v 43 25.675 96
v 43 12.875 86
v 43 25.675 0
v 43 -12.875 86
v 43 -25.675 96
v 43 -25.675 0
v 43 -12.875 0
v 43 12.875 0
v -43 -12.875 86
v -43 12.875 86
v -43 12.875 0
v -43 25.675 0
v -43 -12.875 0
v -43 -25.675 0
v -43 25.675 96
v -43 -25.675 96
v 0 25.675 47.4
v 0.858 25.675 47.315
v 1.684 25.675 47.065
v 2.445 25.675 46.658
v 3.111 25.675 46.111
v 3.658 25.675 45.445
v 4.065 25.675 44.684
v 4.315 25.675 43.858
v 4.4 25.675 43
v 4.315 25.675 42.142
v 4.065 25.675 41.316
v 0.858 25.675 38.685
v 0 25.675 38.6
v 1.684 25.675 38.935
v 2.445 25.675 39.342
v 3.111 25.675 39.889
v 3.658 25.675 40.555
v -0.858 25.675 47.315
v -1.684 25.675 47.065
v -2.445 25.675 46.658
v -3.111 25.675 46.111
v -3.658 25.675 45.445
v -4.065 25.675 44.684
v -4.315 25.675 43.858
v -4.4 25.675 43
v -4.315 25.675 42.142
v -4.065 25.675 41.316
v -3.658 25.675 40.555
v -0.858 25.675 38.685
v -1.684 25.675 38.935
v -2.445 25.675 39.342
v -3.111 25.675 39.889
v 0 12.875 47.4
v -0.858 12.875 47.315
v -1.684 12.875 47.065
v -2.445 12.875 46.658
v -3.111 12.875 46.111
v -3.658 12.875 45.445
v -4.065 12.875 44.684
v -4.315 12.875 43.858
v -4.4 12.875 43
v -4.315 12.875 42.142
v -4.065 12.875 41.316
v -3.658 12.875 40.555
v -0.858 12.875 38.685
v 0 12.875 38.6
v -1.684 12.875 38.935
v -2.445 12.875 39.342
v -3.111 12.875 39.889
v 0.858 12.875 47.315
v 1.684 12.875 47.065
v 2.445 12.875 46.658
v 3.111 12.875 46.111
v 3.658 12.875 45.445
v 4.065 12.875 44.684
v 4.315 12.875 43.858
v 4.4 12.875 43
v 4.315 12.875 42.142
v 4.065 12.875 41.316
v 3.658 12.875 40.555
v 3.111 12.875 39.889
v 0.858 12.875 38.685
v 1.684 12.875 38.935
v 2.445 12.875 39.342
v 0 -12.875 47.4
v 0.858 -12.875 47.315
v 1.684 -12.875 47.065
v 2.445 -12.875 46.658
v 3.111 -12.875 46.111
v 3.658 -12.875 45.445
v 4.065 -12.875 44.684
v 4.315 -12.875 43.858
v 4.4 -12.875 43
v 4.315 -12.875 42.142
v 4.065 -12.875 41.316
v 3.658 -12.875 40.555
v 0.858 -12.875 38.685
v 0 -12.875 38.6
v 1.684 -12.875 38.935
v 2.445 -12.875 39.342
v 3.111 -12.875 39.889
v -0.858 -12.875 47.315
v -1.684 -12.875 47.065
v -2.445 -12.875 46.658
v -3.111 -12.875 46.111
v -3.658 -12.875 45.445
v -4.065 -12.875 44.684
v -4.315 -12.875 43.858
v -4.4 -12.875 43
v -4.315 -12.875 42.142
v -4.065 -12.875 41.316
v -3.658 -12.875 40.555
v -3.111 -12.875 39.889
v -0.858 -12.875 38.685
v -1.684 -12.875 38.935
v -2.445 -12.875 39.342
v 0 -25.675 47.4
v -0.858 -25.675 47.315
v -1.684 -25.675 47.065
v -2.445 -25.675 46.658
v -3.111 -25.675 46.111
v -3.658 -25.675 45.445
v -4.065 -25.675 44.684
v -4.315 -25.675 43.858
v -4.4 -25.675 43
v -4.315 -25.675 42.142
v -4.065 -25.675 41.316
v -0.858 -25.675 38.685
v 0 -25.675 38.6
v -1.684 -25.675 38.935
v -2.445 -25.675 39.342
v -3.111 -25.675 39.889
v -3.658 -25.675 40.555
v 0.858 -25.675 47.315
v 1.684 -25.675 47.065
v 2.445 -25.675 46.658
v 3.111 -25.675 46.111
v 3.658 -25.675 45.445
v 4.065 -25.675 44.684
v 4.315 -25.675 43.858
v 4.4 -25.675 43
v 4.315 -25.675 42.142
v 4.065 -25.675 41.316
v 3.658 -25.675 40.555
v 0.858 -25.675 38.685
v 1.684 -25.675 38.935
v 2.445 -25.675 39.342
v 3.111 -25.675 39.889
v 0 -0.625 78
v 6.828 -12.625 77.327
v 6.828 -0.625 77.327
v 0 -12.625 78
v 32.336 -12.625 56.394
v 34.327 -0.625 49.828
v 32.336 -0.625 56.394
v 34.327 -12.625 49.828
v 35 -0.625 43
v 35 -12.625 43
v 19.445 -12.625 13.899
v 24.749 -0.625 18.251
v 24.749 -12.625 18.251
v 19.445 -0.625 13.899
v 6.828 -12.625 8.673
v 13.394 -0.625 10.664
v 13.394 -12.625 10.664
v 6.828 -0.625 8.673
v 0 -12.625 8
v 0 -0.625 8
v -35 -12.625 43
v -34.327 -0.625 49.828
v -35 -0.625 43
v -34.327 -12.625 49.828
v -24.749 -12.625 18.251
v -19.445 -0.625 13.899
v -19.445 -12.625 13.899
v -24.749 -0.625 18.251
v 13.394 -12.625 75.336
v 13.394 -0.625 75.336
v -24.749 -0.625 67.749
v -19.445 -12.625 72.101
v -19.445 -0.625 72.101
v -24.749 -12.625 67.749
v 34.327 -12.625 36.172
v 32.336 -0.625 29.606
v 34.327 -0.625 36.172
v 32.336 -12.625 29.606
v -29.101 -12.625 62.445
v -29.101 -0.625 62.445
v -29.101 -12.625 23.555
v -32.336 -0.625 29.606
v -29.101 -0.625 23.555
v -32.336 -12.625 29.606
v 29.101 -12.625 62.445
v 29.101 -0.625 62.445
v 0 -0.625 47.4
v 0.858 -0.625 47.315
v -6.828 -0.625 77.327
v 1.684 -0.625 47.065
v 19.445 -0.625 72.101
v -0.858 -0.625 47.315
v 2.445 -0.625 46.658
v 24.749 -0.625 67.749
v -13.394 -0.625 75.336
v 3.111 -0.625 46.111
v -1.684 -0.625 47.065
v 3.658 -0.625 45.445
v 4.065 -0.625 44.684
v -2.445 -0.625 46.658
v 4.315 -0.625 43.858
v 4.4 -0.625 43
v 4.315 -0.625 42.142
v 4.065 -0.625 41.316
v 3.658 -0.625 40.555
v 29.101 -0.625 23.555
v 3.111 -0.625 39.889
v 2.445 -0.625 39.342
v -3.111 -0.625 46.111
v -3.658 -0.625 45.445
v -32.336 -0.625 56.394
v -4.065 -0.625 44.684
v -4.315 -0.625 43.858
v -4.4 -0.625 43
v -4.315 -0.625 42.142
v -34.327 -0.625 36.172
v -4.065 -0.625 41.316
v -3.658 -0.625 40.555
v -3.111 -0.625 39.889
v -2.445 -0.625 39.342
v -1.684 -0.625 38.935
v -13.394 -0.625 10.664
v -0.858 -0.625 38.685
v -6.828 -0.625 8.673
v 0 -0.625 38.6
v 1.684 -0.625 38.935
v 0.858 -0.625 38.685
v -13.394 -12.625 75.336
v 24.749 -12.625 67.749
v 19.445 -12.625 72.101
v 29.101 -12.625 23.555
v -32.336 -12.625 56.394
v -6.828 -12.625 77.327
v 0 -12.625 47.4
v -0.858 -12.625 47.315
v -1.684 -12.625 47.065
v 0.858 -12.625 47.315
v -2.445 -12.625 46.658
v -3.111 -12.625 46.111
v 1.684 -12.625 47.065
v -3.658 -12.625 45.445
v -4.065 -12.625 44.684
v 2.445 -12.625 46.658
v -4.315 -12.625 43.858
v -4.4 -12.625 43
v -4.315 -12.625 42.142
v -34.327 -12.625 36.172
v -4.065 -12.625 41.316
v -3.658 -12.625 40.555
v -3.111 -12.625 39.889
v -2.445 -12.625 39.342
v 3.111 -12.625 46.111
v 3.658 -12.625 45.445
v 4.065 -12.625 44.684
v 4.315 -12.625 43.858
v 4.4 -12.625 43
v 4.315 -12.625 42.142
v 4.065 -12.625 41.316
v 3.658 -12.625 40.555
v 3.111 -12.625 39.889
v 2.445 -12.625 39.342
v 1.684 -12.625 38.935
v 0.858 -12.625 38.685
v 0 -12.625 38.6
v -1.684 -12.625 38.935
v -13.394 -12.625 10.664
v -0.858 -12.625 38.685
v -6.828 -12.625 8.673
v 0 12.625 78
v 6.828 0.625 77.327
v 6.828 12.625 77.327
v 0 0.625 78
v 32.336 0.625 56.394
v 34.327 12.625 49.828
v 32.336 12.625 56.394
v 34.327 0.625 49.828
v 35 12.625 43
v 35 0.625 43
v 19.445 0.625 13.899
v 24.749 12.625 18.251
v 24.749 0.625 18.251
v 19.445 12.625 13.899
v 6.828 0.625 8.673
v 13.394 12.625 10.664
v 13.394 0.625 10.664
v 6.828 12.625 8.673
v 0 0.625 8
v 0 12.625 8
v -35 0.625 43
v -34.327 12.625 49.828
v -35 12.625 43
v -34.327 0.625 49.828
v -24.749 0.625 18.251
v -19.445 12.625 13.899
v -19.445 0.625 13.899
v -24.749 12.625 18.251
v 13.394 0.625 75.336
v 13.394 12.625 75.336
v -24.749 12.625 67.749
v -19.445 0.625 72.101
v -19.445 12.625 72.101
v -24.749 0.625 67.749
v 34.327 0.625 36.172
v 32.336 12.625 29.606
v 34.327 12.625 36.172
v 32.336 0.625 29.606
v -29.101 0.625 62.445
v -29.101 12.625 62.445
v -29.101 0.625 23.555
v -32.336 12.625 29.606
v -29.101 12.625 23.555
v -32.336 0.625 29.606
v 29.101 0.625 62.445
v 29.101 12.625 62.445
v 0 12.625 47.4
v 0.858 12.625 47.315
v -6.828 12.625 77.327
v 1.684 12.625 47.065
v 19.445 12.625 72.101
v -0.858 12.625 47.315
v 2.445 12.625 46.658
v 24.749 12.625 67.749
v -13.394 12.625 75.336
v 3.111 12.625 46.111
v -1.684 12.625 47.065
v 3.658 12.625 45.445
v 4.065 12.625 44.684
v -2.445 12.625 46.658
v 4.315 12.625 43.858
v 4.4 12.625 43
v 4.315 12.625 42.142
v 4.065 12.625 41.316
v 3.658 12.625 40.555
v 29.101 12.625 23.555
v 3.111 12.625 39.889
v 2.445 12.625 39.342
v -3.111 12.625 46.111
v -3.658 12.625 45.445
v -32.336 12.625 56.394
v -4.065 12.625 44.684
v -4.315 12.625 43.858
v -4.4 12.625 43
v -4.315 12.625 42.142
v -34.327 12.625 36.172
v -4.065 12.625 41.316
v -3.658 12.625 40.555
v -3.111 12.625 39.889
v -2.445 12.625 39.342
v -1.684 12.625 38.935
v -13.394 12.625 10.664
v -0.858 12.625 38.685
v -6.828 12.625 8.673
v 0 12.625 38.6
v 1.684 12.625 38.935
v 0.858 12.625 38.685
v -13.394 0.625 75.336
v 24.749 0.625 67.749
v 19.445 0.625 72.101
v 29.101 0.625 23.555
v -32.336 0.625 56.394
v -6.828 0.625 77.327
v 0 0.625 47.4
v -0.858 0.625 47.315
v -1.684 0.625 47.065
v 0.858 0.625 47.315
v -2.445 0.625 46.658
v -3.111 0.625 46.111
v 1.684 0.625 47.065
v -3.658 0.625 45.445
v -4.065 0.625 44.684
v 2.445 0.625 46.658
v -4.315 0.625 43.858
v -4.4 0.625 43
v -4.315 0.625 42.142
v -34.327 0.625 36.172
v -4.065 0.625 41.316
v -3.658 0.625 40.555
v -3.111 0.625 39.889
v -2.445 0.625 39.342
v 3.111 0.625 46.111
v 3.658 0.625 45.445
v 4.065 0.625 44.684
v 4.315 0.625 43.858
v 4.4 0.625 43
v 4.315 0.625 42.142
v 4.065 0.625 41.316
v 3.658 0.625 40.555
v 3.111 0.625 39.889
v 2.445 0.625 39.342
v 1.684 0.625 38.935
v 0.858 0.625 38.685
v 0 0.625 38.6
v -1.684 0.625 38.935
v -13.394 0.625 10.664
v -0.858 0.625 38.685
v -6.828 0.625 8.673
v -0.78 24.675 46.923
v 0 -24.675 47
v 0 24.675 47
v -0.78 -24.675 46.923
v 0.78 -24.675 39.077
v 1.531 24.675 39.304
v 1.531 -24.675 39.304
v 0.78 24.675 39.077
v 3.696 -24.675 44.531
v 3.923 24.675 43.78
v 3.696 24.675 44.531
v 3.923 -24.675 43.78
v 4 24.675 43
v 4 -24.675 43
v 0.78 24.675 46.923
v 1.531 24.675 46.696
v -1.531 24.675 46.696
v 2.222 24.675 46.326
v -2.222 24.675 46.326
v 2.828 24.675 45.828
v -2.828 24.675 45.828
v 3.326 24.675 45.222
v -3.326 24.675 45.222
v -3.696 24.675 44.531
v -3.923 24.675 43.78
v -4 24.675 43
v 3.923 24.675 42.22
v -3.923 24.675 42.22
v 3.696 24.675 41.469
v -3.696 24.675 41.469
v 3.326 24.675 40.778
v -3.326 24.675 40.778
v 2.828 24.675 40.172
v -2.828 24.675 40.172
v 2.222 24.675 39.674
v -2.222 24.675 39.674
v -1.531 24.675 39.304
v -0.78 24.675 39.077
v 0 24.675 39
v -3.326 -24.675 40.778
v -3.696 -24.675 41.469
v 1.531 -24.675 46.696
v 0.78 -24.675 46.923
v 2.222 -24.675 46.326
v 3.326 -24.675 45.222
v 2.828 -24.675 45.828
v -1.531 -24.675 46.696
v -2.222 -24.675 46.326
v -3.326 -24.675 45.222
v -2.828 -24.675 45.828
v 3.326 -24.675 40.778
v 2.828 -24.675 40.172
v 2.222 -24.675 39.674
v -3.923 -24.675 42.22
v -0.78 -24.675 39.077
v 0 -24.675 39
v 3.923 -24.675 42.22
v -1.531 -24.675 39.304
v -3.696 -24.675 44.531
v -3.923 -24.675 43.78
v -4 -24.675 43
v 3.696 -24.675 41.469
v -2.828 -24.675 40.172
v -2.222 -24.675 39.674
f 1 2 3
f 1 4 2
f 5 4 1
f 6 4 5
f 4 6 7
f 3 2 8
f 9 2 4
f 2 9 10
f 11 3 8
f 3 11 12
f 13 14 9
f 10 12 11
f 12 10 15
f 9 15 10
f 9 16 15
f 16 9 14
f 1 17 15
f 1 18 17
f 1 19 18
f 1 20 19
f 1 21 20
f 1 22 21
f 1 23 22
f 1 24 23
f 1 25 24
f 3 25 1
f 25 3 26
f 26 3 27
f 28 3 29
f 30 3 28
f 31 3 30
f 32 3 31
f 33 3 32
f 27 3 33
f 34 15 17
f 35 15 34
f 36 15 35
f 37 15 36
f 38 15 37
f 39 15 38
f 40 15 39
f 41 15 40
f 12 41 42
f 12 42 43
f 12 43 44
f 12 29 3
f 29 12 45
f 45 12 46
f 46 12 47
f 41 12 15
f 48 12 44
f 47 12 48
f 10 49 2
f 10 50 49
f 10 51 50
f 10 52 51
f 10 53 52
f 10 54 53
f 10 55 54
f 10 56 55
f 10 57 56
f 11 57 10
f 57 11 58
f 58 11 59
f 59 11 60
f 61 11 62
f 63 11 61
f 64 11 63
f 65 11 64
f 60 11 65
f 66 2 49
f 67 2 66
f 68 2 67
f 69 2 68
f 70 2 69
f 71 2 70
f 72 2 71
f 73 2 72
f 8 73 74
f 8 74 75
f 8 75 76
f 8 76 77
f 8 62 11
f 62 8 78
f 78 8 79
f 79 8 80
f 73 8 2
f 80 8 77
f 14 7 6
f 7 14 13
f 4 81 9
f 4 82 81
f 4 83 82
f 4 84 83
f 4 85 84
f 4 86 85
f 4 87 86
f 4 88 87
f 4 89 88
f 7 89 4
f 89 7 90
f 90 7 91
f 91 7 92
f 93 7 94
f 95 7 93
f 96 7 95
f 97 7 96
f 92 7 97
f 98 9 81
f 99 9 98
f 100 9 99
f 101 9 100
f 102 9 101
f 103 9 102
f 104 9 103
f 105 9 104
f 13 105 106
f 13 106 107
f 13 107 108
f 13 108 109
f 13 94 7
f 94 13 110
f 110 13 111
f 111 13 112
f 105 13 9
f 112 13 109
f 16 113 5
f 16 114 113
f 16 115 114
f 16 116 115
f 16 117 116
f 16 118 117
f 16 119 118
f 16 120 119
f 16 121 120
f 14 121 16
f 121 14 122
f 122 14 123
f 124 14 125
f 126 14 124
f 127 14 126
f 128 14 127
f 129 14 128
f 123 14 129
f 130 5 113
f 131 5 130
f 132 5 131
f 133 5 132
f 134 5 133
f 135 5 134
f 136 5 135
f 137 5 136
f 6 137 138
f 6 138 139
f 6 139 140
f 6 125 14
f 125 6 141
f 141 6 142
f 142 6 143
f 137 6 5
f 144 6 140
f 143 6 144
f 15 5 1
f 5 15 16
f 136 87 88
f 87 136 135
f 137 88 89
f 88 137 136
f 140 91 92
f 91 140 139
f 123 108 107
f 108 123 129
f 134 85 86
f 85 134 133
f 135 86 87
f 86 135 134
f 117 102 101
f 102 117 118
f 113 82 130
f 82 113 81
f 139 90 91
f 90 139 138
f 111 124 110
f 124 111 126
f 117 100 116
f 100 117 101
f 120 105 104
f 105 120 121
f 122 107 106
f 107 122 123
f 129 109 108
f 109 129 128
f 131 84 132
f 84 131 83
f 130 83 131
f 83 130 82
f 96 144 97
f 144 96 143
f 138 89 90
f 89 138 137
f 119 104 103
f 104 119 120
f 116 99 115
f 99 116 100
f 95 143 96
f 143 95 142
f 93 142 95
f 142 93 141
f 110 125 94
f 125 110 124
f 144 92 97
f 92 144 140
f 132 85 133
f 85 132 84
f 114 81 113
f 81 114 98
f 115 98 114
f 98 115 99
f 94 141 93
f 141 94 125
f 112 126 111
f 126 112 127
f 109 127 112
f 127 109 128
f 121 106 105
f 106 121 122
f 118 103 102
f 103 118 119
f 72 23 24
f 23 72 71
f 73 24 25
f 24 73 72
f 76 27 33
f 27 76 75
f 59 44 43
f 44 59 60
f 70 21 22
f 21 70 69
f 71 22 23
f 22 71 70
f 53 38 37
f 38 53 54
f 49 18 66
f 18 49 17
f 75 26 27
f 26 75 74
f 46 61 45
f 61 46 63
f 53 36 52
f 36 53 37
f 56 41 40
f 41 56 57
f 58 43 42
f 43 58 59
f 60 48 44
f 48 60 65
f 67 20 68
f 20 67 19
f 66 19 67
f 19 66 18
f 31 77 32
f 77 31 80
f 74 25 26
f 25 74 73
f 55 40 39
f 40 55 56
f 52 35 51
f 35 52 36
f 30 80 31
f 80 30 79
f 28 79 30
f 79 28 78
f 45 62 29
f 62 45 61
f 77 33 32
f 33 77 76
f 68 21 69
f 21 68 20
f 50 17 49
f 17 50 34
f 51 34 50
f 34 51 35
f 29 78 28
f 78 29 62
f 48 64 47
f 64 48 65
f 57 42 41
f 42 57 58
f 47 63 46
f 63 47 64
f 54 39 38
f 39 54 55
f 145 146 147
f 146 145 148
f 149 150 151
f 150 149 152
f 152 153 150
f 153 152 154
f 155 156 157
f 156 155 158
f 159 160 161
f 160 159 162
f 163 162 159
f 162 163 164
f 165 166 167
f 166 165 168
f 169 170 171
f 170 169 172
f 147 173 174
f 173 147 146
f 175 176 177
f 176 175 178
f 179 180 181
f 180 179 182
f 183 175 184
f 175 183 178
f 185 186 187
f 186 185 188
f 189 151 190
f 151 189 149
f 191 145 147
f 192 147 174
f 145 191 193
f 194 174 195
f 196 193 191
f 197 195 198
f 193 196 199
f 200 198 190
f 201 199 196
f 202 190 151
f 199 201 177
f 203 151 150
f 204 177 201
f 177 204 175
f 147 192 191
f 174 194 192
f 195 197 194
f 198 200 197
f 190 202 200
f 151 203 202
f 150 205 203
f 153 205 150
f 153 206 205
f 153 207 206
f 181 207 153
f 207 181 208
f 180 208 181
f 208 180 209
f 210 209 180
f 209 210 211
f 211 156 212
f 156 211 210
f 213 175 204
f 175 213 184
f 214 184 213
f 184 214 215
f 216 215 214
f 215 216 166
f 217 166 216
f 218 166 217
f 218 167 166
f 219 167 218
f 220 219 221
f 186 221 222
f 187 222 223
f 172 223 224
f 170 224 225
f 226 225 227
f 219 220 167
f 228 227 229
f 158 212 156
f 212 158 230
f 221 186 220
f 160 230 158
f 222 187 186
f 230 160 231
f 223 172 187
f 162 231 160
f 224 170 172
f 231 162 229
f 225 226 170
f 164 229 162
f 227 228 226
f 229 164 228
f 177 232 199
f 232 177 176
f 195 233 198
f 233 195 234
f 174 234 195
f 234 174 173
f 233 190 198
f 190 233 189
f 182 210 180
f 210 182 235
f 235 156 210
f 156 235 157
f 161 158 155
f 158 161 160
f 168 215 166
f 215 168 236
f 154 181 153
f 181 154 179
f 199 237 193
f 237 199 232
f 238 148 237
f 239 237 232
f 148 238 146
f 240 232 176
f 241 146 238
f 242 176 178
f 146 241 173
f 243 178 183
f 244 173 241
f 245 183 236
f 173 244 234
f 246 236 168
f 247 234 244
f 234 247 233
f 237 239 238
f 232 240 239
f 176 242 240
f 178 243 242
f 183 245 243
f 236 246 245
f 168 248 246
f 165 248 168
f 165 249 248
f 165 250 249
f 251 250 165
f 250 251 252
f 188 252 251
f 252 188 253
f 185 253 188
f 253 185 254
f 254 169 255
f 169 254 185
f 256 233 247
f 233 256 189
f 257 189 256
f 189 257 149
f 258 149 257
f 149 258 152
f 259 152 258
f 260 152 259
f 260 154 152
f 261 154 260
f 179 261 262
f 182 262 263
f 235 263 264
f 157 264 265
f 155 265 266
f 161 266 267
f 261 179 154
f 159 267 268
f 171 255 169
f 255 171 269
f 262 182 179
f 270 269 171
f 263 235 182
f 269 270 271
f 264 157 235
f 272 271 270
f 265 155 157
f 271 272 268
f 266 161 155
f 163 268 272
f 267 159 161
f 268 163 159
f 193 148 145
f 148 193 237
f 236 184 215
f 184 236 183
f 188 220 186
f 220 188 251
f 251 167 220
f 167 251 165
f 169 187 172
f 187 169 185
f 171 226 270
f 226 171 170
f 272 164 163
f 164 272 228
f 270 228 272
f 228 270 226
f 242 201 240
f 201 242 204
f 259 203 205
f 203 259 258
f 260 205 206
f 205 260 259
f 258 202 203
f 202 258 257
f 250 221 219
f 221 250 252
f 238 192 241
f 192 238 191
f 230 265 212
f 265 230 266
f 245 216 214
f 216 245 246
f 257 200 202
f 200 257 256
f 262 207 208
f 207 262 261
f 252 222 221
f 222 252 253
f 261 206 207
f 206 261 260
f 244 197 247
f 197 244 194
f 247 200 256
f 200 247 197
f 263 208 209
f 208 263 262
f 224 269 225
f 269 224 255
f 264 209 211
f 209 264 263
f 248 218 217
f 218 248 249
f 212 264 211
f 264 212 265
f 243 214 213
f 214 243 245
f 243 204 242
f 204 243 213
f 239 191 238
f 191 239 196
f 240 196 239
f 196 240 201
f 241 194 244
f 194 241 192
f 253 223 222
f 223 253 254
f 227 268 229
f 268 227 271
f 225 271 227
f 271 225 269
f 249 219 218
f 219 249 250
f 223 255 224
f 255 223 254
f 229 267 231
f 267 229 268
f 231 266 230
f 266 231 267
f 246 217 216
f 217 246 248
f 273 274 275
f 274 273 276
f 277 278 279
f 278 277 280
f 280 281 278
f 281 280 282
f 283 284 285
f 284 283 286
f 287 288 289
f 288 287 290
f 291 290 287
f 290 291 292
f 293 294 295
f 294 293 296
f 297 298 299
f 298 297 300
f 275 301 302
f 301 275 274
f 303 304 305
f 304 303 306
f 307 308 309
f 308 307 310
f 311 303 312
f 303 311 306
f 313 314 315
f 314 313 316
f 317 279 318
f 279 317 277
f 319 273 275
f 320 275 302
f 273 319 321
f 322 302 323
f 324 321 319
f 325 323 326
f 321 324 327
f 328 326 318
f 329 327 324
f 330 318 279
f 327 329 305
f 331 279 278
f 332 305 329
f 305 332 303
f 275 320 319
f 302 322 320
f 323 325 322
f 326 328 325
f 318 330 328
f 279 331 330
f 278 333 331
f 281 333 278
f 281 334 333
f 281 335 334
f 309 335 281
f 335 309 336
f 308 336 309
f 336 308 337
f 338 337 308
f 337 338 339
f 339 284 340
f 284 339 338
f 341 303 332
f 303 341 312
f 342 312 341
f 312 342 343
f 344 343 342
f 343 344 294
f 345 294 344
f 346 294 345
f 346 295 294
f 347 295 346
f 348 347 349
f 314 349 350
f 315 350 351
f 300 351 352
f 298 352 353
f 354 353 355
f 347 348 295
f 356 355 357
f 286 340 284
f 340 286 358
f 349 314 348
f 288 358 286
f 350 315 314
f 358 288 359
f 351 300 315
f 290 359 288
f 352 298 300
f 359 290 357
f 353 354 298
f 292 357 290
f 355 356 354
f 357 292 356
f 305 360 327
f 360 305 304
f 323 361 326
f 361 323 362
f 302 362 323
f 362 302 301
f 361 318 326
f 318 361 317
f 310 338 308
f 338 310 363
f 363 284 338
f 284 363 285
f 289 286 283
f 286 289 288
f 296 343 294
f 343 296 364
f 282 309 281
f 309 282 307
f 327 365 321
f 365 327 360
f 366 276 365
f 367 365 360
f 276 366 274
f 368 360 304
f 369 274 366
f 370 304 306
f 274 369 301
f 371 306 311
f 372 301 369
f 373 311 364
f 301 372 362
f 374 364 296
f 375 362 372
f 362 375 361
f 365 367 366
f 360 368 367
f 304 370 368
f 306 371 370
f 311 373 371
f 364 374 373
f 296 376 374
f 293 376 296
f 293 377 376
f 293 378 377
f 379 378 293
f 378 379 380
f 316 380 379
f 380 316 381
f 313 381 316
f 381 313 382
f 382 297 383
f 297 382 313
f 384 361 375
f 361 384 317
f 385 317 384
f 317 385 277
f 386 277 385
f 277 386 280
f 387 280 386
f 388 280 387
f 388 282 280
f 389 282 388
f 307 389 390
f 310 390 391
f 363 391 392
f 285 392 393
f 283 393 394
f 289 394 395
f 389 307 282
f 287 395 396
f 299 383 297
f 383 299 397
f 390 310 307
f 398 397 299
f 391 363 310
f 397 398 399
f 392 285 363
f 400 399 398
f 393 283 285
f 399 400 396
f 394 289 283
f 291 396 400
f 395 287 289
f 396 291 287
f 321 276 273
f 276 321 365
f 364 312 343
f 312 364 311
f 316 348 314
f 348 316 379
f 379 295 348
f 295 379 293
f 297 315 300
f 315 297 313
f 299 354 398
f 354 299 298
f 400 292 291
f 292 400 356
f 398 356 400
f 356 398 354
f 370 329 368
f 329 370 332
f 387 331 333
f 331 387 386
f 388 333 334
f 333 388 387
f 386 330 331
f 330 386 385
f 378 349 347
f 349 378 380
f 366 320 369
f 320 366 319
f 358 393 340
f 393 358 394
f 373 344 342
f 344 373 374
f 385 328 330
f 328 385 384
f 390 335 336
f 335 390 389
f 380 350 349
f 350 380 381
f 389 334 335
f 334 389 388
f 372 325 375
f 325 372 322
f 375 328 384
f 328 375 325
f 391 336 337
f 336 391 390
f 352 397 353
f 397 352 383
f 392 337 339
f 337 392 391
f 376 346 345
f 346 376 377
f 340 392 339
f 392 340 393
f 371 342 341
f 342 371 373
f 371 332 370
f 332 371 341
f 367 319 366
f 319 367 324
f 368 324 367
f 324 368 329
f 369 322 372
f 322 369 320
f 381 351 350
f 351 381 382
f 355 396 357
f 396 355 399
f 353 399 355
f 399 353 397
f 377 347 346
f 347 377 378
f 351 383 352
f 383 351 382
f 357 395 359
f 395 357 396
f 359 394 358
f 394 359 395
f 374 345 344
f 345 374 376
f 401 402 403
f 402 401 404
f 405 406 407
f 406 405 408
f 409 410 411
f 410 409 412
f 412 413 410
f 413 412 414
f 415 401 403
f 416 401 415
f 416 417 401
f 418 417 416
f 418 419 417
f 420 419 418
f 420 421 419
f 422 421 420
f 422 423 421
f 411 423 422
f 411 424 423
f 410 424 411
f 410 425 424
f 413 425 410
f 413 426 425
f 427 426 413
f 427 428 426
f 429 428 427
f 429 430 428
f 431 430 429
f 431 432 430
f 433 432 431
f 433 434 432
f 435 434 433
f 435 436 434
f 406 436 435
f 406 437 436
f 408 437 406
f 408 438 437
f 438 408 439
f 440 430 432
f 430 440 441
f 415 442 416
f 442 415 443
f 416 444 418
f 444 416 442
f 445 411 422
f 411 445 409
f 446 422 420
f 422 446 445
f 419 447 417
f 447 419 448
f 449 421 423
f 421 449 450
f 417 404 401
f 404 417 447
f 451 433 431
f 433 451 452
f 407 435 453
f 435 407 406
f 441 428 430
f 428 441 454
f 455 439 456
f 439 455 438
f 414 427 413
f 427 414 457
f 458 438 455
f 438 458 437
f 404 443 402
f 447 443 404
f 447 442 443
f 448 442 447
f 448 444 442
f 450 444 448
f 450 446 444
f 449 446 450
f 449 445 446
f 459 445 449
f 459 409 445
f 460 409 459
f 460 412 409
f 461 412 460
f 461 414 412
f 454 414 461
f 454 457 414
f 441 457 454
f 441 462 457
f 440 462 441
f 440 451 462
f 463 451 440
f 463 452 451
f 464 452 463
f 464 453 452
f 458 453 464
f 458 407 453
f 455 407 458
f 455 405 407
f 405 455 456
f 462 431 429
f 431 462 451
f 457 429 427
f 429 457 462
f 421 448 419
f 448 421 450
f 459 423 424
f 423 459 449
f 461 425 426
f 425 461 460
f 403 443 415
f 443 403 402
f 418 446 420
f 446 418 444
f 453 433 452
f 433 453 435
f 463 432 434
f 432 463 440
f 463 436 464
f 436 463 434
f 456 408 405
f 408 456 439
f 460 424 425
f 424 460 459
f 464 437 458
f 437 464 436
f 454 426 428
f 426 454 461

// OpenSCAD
$fn = 32;

// ------------------------------------------------------------------------
// Trolley wheel set: wheels d70, fork 86 mm tall
// Every part is its own module, assembly() places every instance.
// ------------------------------------------------------------------------

// --- part 1 ---
module trolley_fork() {
  difference() {
    union() {
      translate([-43, 12.875, 0]) cube([86, 12.8, 86]);
      translate([-43, -25.675, 0]) cube([86, 12.8, 86]);
      translate([-43, -25.675, 86]) cube([86, 51.35, 10]);
    }
    translate([0, -19.275, 43]) rotate([90, 0, 0]) cylinder(h = 14.8, d = 8.8, center = true);
    translate([0, 19.275, 43]) rotate([90, 0, 0]) cylinder(h = 14.8, d = 8.8, center = true);
  }
}

// --- part 2 ---
module trolley_wheel() {
  difference() {
      translate([0, 0, 0]) cylinder(h = 12, d = 70);
      translate([0, 0, -1]) cylinder(h = 14, d = 8.8);
    }
}

// --- part 3 ---
module trolley_axle() {
  translate([0, 0, -24.675]) cylinder(h = 49.35, d = 8);
}

// --- assembly ---
module assembly() {
  color([0.80, 0.24, 0.20]) translate([0, 0, 0]) rotate([0, 0, 0]) trolley_fork();
  color([0.20, 0.45, 0.75]) translate([0, -0.625, 43]) rotate([90, 0, 0]) trolley_wheel();
  color([0.25, 0.62, 0.32]) translate([0, 12.625, 43]) rotate([90, 0, 0]) trolley_wheel();
  color([0.92, 0.70, 0.18]) translate([0, 0, 43]) rotate([90, 0, 0]) trolley_axle();
}

assembly();
